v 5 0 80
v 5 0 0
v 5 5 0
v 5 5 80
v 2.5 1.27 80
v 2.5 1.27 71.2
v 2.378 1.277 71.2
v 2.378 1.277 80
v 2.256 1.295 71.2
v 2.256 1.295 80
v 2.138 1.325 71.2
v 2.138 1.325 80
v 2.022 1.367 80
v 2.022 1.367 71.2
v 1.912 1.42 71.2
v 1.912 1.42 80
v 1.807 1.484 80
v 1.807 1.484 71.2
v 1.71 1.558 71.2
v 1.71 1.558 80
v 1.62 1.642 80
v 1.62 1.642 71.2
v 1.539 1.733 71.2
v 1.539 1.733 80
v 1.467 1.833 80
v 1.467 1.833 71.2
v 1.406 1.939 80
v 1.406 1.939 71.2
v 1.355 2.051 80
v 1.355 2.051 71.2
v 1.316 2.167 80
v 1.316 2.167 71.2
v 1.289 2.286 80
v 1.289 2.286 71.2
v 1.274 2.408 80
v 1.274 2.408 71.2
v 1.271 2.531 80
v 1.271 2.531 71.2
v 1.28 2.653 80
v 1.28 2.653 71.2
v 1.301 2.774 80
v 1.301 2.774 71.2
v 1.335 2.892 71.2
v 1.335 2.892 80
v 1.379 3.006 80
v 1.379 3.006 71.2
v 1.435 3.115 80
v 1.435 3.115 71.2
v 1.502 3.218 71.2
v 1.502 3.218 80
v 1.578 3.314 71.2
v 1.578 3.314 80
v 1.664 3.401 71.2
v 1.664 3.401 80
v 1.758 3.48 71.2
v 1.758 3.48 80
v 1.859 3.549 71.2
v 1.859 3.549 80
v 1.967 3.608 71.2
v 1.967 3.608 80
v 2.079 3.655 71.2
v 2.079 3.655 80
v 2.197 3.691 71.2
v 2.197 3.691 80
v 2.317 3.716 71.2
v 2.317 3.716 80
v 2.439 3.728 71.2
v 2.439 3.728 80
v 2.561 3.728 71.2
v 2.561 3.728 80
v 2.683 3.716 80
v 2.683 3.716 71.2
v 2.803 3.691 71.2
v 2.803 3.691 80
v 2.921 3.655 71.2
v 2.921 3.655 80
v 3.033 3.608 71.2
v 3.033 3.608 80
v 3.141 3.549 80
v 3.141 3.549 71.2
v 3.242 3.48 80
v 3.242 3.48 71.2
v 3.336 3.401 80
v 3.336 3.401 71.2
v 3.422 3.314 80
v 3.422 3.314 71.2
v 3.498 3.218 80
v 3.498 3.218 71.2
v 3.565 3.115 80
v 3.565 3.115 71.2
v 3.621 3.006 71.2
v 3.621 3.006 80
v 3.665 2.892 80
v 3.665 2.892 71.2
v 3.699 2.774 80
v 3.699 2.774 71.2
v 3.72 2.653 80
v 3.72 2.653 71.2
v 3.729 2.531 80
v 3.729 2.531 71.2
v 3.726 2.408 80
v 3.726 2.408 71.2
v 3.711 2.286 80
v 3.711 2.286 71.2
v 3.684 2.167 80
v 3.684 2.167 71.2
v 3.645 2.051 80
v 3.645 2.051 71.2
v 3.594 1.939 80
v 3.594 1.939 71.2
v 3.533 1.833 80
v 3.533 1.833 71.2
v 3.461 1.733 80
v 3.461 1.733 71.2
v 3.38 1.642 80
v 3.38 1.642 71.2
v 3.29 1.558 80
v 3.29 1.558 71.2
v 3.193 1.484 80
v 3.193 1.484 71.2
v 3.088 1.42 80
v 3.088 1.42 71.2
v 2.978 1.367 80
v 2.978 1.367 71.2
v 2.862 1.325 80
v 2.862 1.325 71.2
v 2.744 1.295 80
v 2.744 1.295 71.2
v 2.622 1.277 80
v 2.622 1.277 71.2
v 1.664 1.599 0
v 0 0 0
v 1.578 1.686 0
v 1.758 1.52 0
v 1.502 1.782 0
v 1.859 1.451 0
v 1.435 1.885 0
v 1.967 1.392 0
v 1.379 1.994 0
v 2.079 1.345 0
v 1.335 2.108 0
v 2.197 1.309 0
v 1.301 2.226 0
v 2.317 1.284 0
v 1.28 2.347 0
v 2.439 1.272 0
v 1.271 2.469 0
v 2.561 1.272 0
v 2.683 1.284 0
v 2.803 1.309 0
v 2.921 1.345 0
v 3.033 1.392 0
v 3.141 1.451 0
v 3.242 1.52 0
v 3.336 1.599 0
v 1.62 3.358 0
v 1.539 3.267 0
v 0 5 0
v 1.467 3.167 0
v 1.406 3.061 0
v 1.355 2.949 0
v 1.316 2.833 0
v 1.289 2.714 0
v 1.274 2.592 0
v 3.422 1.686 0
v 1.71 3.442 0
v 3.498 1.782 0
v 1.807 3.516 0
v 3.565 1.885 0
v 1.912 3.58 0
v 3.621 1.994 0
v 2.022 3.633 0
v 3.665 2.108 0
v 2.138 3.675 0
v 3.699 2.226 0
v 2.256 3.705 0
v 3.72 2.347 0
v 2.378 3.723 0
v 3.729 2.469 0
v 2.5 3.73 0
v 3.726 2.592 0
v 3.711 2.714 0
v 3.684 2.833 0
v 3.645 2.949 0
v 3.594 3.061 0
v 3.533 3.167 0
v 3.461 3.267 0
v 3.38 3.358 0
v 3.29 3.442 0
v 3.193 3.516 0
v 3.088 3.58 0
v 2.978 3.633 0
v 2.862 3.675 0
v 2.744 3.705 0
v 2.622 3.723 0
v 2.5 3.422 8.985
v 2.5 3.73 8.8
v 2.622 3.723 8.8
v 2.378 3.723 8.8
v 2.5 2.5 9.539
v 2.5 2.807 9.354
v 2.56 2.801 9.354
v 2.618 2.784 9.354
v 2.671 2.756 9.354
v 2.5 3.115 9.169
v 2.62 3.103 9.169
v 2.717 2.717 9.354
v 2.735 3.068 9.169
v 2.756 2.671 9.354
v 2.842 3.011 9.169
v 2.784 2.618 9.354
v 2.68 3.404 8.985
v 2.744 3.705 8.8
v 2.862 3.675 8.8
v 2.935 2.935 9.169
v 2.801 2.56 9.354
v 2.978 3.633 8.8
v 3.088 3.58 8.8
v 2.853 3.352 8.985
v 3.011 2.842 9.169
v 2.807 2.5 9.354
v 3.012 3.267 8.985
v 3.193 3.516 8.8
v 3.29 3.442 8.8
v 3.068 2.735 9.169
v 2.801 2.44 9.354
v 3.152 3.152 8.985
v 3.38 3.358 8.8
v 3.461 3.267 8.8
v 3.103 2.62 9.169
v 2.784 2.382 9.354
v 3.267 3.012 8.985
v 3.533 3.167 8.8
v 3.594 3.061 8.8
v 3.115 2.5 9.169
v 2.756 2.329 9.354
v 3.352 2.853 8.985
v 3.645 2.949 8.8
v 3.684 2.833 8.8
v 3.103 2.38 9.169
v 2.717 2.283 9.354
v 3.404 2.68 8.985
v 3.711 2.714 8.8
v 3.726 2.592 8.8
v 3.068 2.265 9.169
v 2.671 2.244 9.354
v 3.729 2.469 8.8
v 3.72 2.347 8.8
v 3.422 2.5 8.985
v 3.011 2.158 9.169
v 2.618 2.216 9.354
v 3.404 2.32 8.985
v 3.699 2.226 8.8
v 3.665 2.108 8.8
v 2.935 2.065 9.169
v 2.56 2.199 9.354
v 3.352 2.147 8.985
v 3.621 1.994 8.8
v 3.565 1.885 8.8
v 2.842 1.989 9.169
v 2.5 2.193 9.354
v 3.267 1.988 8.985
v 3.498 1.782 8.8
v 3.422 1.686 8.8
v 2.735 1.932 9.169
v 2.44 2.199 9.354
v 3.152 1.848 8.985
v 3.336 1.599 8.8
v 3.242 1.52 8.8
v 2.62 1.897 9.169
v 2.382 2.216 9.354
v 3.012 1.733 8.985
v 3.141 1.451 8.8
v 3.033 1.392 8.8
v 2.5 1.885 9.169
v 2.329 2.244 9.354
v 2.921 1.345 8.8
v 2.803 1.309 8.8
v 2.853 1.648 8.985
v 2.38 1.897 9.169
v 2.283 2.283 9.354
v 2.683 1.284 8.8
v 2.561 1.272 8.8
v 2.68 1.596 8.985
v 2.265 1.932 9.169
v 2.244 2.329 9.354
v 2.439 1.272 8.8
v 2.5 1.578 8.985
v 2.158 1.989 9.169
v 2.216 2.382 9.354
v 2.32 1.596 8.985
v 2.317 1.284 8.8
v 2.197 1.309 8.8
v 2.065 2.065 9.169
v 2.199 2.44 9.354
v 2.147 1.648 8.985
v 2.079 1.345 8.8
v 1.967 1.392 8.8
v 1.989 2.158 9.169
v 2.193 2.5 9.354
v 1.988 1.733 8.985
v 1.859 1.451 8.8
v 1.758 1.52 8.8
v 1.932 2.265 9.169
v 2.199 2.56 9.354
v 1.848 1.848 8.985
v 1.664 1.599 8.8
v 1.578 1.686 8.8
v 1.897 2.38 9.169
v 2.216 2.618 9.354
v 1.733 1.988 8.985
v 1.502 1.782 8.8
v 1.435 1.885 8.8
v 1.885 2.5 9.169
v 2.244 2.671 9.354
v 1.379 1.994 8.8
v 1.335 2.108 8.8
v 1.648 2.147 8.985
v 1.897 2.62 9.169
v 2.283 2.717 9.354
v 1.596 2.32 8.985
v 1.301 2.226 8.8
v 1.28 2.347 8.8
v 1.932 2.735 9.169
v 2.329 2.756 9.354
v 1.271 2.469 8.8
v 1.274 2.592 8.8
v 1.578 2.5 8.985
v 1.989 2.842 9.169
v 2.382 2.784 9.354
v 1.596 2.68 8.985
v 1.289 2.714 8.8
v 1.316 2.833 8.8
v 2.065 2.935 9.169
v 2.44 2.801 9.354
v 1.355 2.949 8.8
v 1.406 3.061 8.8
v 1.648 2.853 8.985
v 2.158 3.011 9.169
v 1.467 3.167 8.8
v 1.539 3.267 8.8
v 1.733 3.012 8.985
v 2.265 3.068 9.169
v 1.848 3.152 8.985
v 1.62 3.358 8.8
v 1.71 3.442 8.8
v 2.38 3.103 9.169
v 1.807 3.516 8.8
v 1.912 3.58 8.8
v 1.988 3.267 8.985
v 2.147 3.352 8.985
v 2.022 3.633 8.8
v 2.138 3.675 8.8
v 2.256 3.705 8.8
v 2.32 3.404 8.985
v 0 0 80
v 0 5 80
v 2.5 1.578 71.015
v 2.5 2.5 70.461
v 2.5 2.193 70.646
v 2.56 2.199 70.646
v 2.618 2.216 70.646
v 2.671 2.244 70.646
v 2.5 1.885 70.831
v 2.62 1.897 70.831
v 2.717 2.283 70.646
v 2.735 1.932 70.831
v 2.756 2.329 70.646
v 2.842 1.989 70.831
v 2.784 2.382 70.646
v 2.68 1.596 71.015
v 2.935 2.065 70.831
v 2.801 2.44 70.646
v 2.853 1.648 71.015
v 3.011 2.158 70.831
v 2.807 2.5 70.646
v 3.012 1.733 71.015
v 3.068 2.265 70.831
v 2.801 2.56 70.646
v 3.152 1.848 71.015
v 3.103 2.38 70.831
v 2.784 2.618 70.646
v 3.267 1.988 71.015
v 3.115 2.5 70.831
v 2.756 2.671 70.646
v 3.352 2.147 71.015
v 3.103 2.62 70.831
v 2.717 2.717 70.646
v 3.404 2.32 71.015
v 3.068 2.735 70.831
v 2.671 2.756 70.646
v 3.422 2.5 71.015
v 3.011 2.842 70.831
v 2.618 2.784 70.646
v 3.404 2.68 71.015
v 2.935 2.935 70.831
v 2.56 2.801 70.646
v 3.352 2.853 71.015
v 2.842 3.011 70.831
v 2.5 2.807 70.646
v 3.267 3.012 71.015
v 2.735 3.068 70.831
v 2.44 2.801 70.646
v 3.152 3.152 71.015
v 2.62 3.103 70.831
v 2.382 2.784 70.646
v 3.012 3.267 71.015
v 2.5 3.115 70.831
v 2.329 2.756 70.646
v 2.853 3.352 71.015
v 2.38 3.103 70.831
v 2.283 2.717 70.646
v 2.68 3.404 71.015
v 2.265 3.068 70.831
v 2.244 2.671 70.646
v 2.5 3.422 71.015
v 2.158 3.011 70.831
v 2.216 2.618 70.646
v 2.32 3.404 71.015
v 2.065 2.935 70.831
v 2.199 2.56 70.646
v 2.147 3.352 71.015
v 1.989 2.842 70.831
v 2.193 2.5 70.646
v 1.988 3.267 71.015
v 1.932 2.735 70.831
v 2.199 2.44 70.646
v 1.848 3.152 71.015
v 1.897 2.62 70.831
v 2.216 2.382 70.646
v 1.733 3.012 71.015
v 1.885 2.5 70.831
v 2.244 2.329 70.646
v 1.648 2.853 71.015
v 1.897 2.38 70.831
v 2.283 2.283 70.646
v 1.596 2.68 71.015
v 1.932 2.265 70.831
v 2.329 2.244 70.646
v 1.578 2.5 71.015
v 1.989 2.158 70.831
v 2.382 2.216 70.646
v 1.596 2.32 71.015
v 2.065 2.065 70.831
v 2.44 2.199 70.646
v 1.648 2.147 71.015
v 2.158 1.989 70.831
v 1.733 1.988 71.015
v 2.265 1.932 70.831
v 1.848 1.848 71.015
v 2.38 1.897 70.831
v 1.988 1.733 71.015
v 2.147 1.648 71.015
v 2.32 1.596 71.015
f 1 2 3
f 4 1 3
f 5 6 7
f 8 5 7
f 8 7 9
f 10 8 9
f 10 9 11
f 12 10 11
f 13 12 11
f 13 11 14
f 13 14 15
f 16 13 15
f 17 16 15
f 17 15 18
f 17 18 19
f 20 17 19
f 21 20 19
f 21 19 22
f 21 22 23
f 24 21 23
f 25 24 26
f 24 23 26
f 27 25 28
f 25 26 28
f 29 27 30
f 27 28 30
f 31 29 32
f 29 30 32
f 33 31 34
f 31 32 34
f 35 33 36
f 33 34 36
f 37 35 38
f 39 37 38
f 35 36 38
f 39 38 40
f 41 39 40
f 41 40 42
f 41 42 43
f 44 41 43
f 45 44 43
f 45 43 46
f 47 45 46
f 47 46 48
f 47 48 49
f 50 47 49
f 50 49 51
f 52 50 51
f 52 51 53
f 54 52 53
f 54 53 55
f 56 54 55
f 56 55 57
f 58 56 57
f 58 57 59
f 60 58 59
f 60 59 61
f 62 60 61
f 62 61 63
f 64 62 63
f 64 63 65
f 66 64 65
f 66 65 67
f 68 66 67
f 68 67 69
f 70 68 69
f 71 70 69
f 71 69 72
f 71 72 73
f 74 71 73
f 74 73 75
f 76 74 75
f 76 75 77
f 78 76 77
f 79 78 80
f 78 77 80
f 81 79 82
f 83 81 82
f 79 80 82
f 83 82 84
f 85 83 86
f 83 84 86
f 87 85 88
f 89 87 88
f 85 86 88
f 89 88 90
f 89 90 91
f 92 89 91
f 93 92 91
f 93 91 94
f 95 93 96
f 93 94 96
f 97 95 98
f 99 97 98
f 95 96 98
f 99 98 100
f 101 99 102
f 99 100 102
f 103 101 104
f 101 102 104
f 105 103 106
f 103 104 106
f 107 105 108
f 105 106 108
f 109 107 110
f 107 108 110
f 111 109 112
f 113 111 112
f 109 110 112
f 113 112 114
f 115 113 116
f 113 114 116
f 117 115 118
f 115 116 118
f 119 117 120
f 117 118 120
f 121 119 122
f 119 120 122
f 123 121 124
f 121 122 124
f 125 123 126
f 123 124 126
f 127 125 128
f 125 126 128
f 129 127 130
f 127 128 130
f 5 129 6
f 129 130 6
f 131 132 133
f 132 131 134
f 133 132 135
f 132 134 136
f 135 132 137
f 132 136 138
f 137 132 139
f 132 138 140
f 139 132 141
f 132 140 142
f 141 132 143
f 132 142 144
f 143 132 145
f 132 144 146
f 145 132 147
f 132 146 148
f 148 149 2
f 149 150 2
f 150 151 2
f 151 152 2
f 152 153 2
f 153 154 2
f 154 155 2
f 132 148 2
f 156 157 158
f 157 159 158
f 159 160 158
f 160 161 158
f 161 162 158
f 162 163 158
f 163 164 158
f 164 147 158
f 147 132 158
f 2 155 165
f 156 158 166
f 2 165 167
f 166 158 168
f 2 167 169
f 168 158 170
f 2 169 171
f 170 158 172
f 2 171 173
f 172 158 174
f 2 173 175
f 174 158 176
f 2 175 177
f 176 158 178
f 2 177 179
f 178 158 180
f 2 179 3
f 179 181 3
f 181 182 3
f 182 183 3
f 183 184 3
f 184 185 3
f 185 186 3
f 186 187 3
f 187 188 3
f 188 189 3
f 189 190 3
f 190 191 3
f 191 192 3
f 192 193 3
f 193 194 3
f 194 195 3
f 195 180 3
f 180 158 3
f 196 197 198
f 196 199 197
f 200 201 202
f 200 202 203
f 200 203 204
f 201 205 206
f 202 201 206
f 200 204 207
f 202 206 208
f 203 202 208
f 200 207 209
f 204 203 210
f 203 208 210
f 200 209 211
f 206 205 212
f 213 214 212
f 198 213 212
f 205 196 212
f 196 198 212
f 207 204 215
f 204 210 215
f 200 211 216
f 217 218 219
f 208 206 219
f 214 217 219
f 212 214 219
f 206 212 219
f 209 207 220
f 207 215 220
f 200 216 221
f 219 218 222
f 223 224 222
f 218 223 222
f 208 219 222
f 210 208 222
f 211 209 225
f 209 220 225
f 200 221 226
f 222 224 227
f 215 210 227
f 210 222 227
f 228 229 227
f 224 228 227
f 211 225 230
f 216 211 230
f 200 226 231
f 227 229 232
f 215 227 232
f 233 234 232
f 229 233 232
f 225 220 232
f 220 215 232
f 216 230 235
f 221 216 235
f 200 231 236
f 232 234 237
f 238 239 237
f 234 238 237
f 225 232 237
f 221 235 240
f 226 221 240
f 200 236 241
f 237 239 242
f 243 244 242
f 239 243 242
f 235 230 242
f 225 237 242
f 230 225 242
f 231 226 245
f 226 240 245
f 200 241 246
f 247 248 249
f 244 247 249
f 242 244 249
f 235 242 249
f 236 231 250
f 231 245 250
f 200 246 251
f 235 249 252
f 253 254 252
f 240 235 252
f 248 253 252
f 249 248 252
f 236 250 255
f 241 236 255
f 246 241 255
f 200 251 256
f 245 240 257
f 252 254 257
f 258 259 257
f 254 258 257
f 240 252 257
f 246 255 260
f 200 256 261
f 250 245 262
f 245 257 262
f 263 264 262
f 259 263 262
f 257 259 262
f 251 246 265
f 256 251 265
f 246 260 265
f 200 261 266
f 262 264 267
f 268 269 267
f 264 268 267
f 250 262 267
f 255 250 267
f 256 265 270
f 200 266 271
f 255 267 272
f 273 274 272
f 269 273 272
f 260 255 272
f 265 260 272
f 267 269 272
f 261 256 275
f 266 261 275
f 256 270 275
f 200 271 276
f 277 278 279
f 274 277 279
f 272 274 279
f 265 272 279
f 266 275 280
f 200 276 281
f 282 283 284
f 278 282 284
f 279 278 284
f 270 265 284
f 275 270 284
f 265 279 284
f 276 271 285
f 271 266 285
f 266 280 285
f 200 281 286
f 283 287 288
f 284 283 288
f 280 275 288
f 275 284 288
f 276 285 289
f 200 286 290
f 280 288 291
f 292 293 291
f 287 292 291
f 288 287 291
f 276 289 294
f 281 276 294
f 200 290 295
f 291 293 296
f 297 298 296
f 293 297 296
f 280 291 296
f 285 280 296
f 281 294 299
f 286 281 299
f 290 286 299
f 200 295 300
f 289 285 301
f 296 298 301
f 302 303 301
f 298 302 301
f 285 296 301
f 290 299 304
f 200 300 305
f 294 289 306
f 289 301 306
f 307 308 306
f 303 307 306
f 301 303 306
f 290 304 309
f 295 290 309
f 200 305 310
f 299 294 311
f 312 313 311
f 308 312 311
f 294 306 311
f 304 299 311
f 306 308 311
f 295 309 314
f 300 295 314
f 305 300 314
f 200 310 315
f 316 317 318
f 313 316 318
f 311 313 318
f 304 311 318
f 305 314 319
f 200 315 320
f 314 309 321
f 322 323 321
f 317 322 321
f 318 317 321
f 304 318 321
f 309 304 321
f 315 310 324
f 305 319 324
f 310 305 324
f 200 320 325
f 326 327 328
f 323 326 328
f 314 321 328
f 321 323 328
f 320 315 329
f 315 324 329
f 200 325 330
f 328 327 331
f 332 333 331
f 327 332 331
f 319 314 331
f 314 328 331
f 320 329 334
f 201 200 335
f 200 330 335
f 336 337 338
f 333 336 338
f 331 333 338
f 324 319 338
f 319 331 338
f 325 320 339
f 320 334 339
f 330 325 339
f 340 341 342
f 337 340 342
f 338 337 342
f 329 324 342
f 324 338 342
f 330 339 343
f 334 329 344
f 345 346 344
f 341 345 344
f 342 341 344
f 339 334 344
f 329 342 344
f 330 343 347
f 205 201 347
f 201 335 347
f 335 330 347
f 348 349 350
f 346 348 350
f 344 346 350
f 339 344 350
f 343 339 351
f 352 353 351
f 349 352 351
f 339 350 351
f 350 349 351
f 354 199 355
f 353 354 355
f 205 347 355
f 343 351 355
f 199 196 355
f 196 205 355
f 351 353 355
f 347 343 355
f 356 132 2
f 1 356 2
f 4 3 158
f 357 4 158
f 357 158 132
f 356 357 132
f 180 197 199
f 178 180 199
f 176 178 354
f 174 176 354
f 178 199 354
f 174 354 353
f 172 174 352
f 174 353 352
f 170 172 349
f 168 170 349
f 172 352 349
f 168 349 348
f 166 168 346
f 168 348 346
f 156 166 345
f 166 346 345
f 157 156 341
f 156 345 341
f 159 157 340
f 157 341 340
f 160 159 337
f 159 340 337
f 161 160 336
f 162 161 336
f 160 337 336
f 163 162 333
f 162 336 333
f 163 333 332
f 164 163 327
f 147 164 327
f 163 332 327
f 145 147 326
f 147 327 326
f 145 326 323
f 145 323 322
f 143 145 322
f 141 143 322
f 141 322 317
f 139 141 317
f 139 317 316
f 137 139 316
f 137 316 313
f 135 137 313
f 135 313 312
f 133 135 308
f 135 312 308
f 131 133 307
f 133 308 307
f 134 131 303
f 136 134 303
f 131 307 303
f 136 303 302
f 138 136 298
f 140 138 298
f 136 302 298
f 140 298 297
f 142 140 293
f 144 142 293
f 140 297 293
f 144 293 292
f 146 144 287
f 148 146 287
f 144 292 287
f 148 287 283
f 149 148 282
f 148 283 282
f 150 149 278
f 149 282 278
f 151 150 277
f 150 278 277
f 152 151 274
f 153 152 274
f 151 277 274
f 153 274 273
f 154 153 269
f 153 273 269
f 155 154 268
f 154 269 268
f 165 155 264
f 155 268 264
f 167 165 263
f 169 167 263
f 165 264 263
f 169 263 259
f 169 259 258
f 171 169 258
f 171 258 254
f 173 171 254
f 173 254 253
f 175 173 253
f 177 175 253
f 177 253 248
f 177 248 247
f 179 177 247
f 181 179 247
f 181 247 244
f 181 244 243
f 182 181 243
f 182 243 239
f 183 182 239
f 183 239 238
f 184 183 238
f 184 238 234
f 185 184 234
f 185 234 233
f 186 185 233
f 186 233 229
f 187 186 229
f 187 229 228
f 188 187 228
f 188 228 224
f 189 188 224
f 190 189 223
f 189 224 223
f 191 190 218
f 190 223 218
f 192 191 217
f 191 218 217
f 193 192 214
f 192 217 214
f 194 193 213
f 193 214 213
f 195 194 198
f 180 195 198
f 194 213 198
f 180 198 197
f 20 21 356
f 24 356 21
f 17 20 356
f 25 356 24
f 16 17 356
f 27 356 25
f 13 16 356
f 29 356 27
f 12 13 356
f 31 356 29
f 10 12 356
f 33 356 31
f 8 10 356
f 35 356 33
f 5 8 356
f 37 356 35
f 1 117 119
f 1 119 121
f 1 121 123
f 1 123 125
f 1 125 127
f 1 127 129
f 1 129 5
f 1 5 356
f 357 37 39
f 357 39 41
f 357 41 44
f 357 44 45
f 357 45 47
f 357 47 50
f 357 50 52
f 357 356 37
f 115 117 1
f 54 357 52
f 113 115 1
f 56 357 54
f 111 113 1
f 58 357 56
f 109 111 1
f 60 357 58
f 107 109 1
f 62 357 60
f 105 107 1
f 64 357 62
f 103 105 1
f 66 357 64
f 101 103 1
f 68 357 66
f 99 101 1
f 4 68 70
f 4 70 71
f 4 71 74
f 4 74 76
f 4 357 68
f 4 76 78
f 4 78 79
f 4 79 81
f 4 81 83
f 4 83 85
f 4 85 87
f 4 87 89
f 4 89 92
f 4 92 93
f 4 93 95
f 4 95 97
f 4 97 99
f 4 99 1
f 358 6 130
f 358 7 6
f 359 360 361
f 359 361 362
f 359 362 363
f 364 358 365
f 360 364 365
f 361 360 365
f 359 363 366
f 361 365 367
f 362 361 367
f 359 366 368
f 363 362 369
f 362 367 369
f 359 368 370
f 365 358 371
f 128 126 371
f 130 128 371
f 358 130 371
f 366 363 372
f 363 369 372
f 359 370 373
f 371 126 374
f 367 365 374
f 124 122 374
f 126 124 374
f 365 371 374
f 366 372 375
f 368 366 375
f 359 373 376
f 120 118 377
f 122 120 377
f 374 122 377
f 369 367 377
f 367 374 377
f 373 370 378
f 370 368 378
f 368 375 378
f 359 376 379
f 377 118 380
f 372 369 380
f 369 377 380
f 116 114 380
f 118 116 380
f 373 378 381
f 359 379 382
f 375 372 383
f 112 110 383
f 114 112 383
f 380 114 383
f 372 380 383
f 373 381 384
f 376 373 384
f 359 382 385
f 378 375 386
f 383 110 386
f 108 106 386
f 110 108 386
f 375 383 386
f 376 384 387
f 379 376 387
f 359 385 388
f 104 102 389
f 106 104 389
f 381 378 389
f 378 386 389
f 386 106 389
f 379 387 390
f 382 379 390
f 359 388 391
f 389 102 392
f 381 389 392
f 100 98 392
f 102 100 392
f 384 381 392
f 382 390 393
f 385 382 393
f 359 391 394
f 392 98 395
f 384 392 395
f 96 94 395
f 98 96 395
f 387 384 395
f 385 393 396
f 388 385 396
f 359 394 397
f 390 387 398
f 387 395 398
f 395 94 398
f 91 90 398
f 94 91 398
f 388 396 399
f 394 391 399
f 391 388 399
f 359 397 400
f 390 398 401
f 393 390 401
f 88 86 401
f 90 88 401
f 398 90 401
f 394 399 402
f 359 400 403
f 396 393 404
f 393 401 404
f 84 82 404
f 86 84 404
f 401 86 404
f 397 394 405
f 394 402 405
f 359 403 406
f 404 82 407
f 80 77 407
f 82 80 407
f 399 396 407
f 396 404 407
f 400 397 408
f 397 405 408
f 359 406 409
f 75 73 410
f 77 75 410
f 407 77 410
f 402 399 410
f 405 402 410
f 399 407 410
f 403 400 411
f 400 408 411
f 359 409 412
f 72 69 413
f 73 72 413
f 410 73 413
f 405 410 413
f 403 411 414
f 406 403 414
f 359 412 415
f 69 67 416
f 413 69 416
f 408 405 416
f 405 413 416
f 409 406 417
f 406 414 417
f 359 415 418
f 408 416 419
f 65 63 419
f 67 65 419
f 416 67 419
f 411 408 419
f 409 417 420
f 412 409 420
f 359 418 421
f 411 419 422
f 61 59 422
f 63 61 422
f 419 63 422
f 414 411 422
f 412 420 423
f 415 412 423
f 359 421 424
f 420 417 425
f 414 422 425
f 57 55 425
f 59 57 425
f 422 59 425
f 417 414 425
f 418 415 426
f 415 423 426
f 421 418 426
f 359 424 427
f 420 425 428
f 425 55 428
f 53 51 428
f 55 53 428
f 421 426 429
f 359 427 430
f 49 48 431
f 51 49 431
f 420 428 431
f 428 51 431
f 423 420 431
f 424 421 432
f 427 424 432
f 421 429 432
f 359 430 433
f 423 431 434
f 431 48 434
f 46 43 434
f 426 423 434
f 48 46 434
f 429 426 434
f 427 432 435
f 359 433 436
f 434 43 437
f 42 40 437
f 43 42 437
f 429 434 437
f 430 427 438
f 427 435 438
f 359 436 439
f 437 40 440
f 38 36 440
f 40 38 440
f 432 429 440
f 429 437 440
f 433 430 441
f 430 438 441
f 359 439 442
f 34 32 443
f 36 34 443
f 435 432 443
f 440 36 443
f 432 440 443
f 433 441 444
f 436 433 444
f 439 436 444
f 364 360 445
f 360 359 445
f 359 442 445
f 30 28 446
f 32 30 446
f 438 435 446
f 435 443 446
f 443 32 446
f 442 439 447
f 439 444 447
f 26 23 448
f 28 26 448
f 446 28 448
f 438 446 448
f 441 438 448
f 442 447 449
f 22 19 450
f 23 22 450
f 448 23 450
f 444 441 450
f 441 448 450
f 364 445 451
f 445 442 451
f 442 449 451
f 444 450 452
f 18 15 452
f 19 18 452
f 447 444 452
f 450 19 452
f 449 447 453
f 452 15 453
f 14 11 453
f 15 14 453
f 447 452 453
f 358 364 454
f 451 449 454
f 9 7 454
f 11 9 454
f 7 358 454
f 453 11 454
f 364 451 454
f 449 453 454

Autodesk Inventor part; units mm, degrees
ref_plane "YZ Plane" through (0, 0, 0) normal (1, 0, 0) x (0, 1, 0)
ref_plane "XZ Plane" through (0, 0, 0) normal (0, 1, 0) x (-1, 0, 0)
ref_plane "XY Plane" through (0, 0, 0) normal (0, 0, 1) x (1, 0, 0)
sketch "スケッチ1" plane through (0, 0, 0) normal (0, 0, 1) x (1, 0, 0)
  line L0 (0, 0) -> (5, 0)
  line L1 (5, 0) -> (5, 5)
  line L2 (5, 5) -> (0, 5)
  line L3 (0, 5) -> (0, 0)
  dimension "d0" = 5
  dimension "d1" = 5
extrude "押し出し1" add sketch "スケッチ1" along normal blind 80
sketch "スケッチ2" plane through (0, 0, 80) normal (0, 0, 1) x (1, 0, 0)
  line L0 (0, 0) -> (5, 0) projected
  line L1 (0, 5) -> (0, 0) projected
  point P0 (2.5, 2.5)
  point P1 (2.5, 0)
  point P2 (0, 2.5)
hole "穴1" at (2.5, 2.5, 80) direction (0, 0, -1) diameter 2.459 depth 8.8 tip angle 118 thread size "M3x0.5" class "6H" standard "ANSI Metric M Profile"
sketch "スケッチ3" plane through (0, 0, 0) normal (0, 0, -1) x (-1, 0, 0)
  line L0 (0, 5) -> (0, 0) projected
  line L1 (-5, 5) -> (0, 5) projected
  point P0 (-2.5, 2.5)
  point P1 (0, 2.5)
  point P2 (-2.5, 5)
hole "穴2" at (2.5, 2.5, 0) direction (0, 0, 1) diameter 2.459 depth 8.8 tip angle 118 thread size "M3x0.5" class "6H" standard "ANSI Metric M Profile"
properties part number "天板スペーサ"
